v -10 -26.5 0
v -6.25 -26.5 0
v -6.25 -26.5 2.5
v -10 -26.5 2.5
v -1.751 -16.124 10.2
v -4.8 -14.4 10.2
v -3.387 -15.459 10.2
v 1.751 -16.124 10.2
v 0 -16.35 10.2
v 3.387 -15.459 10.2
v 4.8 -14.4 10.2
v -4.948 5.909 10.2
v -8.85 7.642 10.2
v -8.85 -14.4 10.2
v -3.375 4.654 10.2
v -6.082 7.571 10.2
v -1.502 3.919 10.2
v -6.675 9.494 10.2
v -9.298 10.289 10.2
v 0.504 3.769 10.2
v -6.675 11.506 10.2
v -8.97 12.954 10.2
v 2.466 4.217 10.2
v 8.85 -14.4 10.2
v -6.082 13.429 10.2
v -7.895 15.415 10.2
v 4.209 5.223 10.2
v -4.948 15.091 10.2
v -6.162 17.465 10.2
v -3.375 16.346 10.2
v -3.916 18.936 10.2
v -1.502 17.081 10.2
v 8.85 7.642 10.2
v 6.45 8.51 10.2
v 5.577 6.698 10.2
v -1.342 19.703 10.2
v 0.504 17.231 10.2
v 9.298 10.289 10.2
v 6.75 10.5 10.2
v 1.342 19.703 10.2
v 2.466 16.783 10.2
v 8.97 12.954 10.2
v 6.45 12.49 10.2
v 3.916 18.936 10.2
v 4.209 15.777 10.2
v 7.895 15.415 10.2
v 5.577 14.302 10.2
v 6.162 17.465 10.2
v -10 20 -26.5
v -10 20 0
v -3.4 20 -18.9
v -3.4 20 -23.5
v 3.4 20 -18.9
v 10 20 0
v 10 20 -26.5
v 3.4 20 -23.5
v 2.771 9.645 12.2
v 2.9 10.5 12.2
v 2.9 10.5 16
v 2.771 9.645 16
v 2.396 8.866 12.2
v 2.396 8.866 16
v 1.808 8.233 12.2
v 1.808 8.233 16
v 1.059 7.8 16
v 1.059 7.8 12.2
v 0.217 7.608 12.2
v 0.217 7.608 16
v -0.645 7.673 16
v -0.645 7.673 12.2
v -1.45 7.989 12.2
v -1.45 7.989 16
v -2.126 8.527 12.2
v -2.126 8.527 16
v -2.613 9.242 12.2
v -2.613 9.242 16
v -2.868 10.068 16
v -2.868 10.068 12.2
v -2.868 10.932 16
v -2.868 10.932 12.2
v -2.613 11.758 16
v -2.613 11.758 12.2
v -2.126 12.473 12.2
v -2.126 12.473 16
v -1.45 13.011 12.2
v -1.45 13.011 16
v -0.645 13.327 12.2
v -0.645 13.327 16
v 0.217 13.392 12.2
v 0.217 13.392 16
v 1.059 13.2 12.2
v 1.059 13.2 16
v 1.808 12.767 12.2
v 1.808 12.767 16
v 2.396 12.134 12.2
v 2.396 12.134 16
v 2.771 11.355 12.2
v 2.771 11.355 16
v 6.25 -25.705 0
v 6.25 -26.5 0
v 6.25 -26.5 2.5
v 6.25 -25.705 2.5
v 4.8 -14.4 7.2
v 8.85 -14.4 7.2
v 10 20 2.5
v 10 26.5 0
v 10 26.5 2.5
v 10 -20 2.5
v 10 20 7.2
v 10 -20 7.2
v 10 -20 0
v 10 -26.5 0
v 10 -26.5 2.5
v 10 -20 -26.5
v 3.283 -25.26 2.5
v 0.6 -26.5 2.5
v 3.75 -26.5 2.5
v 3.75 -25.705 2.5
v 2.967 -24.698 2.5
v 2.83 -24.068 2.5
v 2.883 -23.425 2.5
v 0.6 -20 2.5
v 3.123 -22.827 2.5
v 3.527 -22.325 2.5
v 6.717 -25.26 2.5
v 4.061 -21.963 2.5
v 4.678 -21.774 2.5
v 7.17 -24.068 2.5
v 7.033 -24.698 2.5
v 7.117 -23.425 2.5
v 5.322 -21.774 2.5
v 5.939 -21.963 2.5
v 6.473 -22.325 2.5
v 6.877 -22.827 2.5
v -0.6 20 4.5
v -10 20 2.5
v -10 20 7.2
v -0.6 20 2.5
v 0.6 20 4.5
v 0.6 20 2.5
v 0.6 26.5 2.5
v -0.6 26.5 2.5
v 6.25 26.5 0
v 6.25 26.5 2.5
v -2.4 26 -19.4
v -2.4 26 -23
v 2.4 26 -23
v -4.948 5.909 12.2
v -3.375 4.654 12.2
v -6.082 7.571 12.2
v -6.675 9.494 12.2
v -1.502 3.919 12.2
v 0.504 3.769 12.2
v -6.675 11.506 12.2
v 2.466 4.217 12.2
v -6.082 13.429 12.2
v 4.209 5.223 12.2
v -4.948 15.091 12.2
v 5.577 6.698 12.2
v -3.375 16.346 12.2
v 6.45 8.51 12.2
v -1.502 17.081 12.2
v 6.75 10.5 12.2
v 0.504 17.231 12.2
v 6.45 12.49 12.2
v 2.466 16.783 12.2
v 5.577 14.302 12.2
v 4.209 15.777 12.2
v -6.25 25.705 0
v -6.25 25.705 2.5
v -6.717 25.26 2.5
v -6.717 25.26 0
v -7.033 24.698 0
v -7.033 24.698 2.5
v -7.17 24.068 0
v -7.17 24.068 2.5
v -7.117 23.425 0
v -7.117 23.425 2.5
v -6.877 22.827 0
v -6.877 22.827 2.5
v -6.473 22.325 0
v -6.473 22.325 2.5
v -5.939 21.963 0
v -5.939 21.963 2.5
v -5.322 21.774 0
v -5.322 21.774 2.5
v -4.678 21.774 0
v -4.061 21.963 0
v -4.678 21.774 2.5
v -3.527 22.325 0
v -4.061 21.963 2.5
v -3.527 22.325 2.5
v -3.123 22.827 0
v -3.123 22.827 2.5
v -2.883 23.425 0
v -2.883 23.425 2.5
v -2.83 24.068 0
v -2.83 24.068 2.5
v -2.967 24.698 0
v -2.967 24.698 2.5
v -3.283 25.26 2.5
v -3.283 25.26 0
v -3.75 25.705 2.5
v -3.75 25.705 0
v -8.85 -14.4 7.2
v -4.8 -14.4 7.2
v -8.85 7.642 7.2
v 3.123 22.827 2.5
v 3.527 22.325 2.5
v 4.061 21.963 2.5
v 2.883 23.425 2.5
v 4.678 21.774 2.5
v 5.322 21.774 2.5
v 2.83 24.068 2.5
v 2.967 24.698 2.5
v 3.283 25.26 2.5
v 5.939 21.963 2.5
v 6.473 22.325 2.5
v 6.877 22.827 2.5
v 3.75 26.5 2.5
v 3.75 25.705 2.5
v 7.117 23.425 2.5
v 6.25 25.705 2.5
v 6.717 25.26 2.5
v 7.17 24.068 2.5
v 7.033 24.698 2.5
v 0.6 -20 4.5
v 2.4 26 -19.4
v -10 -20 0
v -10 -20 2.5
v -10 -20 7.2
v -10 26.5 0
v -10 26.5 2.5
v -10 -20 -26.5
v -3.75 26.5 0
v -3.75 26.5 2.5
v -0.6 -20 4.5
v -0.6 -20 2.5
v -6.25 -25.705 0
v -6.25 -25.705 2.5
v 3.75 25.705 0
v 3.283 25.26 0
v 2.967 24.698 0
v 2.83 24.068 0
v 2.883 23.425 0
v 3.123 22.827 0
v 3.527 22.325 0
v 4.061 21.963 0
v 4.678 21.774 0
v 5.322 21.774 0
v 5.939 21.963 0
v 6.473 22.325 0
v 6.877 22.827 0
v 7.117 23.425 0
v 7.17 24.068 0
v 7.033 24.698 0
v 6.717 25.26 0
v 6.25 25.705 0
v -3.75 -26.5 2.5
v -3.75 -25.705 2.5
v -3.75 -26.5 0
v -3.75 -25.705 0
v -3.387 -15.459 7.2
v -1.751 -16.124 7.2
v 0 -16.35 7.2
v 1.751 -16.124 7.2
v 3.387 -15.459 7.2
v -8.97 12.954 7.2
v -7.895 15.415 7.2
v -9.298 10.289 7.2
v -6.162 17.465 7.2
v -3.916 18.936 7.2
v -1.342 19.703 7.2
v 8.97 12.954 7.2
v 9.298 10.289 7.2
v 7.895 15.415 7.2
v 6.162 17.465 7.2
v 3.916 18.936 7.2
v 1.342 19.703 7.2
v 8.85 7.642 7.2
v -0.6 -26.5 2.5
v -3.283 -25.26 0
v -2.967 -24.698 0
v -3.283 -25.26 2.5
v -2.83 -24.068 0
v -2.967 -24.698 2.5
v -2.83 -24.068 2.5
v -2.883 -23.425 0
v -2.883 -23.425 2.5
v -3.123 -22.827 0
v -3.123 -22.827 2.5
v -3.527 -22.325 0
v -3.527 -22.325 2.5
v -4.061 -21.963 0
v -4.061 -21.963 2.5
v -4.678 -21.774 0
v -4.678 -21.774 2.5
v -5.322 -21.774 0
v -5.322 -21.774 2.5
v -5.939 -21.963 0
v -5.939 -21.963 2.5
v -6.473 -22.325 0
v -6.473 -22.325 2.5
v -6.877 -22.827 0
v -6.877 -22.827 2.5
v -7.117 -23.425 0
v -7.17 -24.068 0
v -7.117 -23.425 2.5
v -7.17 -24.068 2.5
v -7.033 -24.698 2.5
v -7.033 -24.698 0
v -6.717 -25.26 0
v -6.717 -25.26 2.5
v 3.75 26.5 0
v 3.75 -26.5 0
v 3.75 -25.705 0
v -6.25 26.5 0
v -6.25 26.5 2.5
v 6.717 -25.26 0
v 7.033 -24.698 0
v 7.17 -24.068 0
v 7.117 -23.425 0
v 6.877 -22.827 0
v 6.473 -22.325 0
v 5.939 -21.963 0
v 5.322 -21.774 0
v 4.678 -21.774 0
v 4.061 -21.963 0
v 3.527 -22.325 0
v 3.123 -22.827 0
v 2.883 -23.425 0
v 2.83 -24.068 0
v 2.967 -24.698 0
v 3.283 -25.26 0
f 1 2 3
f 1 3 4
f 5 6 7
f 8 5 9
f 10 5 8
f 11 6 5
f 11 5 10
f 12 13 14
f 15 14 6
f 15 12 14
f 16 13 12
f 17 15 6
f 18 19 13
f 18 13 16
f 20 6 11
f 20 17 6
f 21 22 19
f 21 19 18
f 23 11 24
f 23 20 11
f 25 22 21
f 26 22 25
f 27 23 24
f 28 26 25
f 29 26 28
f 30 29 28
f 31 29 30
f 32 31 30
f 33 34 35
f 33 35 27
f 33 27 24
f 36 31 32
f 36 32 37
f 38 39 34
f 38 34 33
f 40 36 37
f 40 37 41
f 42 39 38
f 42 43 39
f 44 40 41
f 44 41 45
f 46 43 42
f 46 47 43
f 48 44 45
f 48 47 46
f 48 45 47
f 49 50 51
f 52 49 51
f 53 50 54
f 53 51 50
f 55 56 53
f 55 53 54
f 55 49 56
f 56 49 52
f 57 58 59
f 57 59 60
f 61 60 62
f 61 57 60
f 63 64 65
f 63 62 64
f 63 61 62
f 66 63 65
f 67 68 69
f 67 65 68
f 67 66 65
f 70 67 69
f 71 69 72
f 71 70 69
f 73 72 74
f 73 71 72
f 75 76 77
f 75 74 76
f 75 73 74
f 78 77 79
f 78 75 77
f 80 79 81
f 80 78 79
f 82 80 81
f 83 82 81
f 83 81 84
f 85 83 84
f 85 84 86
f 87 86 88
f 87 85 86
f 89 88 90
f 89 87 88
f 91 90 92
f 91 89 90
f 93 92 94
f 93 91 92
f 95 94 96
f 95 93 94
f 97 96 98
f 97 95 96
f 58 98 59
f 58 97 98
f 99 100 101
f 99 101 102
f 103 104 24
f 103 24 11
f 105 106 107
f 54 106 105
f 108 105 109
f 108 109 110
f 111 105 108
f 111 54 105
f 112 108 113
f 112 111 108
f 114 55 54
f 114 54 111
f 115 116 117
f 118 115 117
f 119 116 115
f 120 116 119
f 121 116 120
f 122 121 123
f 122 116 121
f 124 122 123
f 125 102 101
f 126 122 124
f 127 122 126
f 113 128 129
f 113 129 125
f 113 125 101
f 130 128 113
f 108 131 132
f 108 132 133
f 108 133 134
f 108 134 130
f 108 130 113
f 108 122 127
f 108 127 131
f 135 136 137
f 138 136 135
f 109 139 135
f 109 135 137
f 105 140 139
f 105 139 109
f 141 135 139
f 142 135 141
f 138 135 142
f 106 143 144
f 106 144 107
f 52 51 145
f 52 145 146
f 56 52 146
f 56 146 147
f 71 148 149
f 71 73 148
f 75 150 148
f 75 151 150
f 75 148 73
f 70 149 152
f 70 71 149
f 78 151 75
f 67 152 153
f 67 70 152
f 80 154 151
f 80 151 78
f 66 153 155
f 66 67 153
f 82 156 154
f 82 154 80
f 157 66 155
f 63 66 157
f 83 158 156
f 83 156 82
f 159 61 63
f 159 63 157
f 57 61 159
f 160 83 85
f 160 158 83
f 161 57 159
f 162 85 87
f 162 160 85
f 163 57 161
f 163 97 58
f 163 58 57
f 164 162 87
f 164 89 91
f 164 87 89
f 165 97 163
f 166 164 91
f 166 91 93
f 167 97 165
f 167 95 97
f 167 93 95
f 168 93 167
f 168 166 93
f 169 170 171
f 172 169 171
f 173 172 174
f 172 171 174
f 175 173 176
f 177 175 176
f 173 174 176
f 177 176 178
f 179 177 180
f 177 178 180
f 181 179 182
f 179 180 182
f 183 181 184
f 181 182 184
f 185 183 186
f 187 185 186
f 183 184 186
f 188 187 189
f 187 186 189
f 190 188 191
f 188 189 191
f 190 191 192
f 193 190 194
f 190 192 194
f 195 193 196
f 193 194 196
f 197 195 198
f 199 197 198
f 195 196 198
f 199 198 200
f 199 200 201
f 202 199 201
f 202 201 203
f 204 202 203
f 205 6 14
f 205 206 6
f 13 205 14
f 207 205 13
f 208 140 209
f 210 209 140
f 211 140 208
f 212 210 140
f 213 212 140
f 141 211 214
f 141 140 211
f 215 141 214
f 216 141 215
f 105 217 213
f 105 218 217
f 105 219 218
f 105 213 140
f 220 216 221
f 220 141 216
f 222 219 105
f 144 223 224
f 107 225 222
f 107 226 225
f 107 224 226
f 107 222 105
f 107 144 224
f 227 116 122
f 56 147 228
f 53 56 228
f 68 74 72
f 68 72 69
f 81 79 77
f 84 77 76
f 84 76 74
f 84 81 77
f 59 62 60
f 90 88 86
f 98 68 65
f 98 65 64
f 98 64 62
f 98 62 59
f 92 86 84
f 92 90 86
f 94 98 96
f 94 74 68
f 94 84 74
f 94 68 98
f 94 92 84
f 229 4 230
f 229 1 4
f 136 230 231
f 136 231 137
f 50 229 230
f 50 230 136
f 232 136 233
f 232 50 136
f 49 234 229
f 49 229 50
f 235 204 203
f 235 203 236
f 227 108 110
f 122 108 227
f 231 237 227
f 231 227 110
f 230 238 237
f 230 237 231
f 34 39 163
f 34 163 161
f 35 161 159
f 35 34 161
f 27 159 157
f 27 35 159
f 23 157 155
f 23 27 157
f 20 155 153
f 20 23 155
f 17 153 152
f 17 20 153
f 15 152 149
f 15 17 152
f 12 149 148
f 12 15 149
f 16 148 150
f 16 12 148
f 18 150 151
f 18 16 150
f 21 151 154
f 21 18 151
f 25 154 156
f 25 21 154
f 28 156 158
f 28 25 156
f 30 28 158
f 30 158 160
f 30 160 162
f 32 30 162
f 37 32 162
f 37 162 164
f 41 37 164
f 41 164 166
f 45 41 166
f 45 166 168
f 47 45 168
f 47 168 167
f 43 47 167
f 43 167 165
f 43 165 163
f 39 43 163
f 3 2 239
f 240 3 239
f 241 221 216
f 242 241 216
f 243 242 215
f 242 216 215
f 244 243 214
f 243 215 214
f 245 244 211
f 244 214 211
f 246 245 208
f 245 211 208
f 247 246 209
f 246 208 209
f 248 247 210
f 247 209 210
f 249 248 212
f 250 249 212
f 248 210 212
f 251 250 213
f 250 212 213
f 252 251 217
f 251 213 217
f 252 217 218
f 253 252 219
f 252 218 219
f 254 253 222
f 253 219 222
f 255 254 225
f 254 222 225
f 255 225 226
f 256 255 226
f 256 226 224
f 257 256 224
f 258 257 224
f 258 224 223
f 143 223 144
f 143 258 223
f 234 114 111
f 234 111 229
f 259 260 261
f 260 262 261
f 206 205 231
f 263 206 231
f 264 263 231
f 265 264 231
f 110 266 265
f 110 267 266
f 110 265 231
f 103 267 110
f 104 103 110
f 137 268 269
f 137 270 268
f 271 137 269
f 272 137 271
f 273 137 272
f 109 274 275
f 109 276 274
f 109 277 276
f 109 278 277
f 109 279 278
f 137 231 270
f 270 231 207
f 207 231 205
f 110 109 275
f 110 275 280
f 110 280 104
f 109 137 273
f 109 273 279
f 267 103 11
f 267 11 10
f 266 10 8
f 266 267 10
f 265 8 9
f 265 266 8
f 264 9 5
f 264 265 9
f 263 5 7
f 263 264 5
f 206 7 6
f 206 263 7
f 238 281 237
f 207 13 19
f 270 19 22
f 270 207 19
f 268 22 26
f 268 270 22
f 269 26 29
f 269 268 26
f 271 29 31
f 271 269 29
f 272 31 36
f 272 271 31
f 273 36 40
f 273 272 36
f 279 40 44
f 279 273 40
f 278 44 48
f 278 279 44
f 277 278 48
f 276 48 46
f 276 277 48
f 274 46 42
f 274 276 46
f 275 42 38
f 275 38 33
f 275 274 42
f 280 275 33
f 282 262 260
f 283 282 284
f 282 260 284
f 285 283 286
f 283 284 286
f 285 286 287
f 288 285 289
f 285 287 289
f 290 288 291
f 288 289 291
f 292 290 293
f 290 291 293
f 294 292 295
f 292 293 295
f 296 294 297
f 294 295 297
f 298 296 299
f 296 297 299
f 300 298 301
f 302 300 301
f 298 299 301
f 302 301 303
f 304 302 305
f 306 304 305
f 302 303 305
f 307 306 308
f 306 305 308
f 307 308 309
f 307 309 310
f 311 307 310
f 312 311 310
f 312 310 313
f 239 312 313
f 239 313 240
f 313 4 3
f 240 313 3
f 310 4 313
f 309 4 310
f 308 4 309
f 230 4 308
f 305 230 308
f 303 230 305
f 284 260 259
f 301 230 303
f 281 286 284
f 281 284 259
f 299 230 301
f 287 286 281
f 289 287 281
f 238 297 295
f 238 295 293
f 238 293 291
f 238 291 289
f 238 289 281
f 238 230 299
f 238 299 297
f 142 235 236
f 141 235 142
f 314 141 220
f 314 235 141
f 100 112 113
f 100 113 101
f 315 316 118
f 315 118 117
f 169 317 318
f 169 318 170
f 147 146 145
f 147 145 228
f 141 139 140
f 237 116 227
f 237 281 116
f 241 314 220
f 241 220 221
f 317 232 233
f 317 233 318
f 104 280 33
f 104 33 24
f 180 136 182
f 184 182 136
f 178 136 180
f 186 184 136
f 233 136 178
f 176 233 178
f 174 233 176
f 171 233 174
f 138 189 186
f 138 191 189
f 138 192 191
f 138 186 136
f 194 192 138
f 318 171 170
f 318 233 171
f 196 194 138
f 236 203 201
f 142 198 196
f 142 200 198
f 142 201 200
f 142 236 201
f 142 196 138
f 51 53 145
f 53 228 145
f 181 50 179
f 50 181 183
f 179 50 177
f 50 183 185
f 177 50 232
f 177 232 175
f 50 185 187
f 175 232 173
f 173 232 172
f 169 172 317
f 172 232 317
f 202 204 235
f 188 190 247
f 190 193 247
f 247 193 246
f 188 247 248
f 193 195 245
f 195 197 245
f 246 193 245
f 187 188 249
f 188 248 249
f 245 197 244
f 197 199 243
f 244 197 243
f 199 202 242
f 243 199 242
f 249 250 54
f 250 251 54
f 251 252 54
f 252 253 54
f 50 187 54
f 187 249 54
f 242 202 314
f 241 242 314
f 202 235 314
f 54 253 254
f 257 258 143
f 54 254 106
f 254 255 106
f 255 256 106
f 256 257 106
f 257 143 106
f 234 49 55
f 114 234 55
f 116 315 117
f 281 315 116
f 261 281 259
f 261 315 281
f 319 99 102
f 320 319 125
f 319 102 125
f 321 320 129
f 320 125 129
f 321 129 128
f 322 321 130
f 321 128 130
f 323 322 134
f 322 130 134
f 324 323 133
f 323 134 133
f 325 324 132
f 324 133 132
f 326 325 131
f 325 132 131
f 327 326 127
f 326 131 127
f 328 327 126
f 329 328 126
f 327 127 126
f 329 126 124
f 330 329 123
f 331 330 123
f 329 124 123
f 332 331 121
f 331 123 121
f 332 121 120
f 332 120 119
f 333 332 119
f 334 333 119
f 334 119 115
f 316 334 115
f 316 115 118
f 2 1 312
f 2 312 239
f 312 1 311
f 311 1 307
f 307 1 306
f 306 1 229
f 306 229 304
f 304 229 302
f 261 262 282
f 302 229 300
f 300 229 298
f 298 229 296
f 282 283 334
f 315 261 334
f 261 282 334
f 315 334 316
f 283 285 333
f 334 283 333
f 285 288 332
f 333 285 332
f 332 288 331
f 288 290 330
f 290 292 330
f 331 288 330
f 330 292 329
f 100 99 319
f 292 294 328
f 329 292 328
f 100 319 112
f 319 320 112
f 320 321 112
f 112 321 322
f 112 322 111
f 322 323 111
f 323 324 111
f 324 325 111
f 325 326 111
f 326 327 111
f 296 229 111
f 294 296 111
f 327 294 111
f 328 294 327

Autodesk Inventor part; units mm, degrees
ref_plane "YZ Plane" through (0, 0, 0) normal (1, 0, 0) x (0, 1, 0)
ref_plane "XZ Plane" through (0, 0, 0) normal (0, 1, 0) x (-1, 0, 0)
ref_plane "XY Plane" through (0, 0, 0) normal (0, 0, 1) x (1, 0, 0)
sketch "Sketch1" plane through (0, 0, 0) normal (0, 0, 1) x (1, 0, 0)
  line L0 (-14, 0) -> (14, 0) projected
  line L1 (0, 28) -> (0, -28) projected
  line L2 (-10, 20) -> (10, 20)
  line L3 (10, 20) -> (10, -20)
  line L4 (10, -20) -> (-10, -20)
  line L5 (-10, -20) -> (-10, 20)
  point P0 (0, 0)
  dimension "d0" = 20
  dimension "d1" = 40
extrude "Extrusion1" add sketch "Sketch1" along normal blind 7.2 and the other way blind 26.5
sketch "Sketch2" plane through (0, 0, 0) normal (0, 0, 1) x (1, 0, 0)
  line L0 (-14, 0) -> (14, 0) projected
  line L1 (0, 28) -> (0, -28) projected
  line L2 (-10, 20) -> (-10, -20) projected
  line L3 (10, -20) -> (10, 20) projected
  line L4 (-10, 26.5) -> (10, 26.5)
  line L5 (10, 26.5) -> (10, -26.5)
  line L6 (10, -26.5) -> (-10, -26.5)
  line L7 (-10, -26.5) -> (-10, 26.5)
  point P0 (0, 0)
  dimension "d6" = 53
extrude "Extrusion2" add sketch "Sketch2" along normal blind 2.5
sketch "Sketch3" plane through (0, 0, 0) normal (0, 0, 1) x (1, 0, 0)
  line L0 (0, 37.1) -> (0, -37.1) projected
  line L1 (-14, 0) -> (14, 0) projected
  line L2 (-5, 23.925) -> (5, 23.925) construction
  line L3 (5, 23.925) -> (5, -23.925) construction
  line L4 (5, -23.925) -> (-5, -23.925) construction
  line L5 (-5, -23.925) -> (-5, 23.925) construction
  point P0 (0, 0)
  dimension "d9" = 47.85
  dimension "d10" = 10
hole "Hole1" at (5, 23.925, 0) at (-5, 23.925, 0) at (-5, -23.925, 0) at (5, -23.925, 0) direction (0, 0, 1) diameter 4.35 depth 8 tip angle 118
sketch "Sketch4" plane through (0, 0, 0) normal (0, 0, 1) x (1, 0, 0)
  line L0 (-14, 0) -> (14, 0) projected
  line L1 (0, 37.1) -> (0, -37.1) projected
  line L2 (10, 26.5) -> (-10, 26.5) projected
  line L3 (-10, -26.5) -> (10, -26.5) projected
  circle A0 centre (-5, 23.925) radius 2.175 projected
  circle A1 centre (5, 23.925) radius 2.175 projected
  circle A2 centre (-5, -23.925) radius 2.175 projected
  circle A3 centre (5, -23.925) radius 2.175 projected
  line L4 (-6.25, -23.925) -> (-3.75, -23.925)
  line L5 (-3.75, -23.925) -> (-3.75, -26.5)
  line L6 (-3.75, -26.5) -> (-6.25, -26.5)
  line L7 (-6.25, -26.5) -> (-6.25, -23.925)
  line L8 (6.25, -23.925) -> (3.75, -23.925)
  line L9 (3.75, -23.925) -> (3.75, -26.5)
  line L10 (3.75, -26.5) -> (6.25, -26.5)
  line L11 (6.25, -26.5) -> (6.25, -23.925)
  line L12 (-10, 26.5) -> (10, 26.5) projected
  line L13 (6.25, 26.5) -> (3.75, 26.5)
  line L14 (3.75, 26.5) -> (3.75, 23.925)
  line L15 (3.75, 23.925) -> (6.25, 23.925)
  line L16 (6.25, 23.925) -> (6.25, 26.5)
  line L17 (-3.75, 26.5) -> (-6.25, 26.5)
  line L18 (-6.25, 26.5) -> (-6.25, 23.925)
  line L19 (-6.25, 23.925) -> (-3.75, 23.925)
  line L20 (-3.75, 23.925) -> (-3.75, 26.5)
  point P0 (0, 0)
  dimension "d18" = 2.5
  dimension "d19" = 2.5
  dimension "d20" = 2.5
  dimension "d21" = 2.5
extrude "Extrusion3" cut sketch "Sketch4" along normal through all contours L9 A3 L11 L3 | L3 L7 A2 L5 | L2 L16 A1 L14 | L20 A0 L18 L2 | A1 L16 L15 L14 | L20 L19 L18 A0 | A2 L7 L4 L5 | L9 L8 L11 A3 picked at (4.9114, 24.6446) picked at (-5.0886, 24.6446) picked at (-5.0886, -24.6446) picked at (4.9114, -24.6446)
sketch "Sketch5" plane through (0, 0, 0) normal (1, 0, 0) x (0, 1, 0)
  line L0 (20, 2.5) -> (26.5, 2.5) projected
  line L1 (20, 7.2) -> (20, 2.5) projected
  line L2 (26.5, 2.5) -> (20, 2.5)
  line L3 (20, 2.5) -> (20, 4.5)
  line L4 (20, 4.5) -> (26.5, 2.5)
  point P0 (0, 0)
  dimension "d24" = 2
extrude "Extrusion4" add sketch "Sketch5" along normal mid plane 1.2
mirror "Mirror1" about plane through (0, 0, 0) normal (0, 1, 0) of "Extrusion4"
sketch "Sketch6" plane through (0, 0, 7.2) normal (0, 0, 1) x (1, 0, 0)
  line L0 (0, 37.1) -> (0, -37.1) projected
  line L1 (-14, 0) -> (14, 0) projected
  circle A0 centre (0, 10.5) radius 6.75
  line L2 (-10, -20) -> (10, -20) projected
  point P0 (0, 0)
  dimension "d27" = 30.5
  dimension "d28" = 13.5
extrude "Extrusion5" add sketch "Sketch6" along normal blind 5
sketch "Sketch7" plane through (0, 0, 7.2) normal (0, 0, 1) x (1, 0, 0)
  circle A0 centre (0, 10.5) radius 6.75 projected
  circle A1 centre (0, 10.5) radius 9.3
  point P0 (0, 0)
  dimension "d31" = 18.6
extrude "Extrusion6" add sketch "Sketch7" along normal blind 3
sketch "Sketch8" plane through (0, 0, 7.2) normal (0, 0, 1) x (1, 0, 0)
  line L0 (-14, 0) -> (14, 0) projected
  line L1 (0, 37.1) -> (0, -37.1) projected
  circle A0 centre (0, 10.5) radius 9.3 projected
  line L2 (-8.85, 10.5) -> (8.85, 10.5)
  line L3 (8.85, 10.5) -> (8.85, -14.4)
  line L4 (8.85, -14.4) -> (-8.85, -14.4)
  line L5 (-8.85, -14.4) -> (-8.85, 10.5)
  line L6 (10, 20) -> (-10, 20) projected
  point P0 (0, 0)
  dimension "d34" = 17.7
  dimension "d35" = 34.4
extrude "Extrusion7" add sketch "Sketch8" along normal blind 3 contours L5 A0 L1 L0 | L0 L1 L4 L5 | L1 A0 L3 L0 | L0 L3 L4 L1 | L5 L2 L1 A0 | L1 L2 L3 A0 picked at (-5.9, 9.5474) picked at (5.9, 9.5474)
sketch "Sketch9" plane through (0, 0, 7.2) normal (0, 0, 1) x (1, 0, 0)
  line L0 (0, 37.1) -> (0, -37.1) projected
  line L1 (10, 20) -> (-10, 20) projected
  line L2 (-8.85, -14.4) -> (8.85, -14.4) projected
  arc A0 (-4.8, -14.4) -> (4.8, -14.4) centre (0, -9.4673) ccw
  point P0 (0, 0)
  dimension "d38" = 9.6
  dimension "d39" = 36.35
extrude "Extrusion8" add sketch "Sketch9" along normal blind 3
sketch "Sketch10" plane through (-10, 20, -26.5) normal (0, 1, 0) x (1, 0, 0)
  line L0 (0, 0) -> (20, 0) projected
  line L1 (10, 7.74) -> (10, -46.44) projected
  line L2 (0, -26.5) -> (20, -26.5) projected
  line L3 (20, -26.5) -> (20, 0) projected
  line L4 (0, 0) -> (20, 0) projected
  line L5 (0, 0) -> (0, -26.5) projected
  line L6 (6.6, -7.6) -> (13.4, -7.6)
  line L7 (13.4, -7.6) -> (13.4, -3)
  line L8 (13.4, -3) -> (6.6, -3)
  line L9 (6.6, -3) -> (6.6, -7.6)
  point P0 (10, -26.5)
  dimension "d42" = 3
  dimension "d43" = 4.6
  dimension "d44" = 6.8
extrude "Extrusion9" add sketch "Sketch10" along normal blind 6 contours L8 L7 L6 L1 | L1 L6 L9 L8
chamfer "Chamfer1" distance 6 distance2 1 1 edges at (3.4, 26, -21.2) measured on face at (3.4, 22, -20.4333)
chamfer "Chamfer2" distance 6 distance2 1 1 edges at (-3.4, 26, -21.2) measured on face at (-3.4, 22, -21.9667)
chamfer "Chamfer3" distance 6 distance2 0.5 1 edges at (0, 26, -18.9) measured on face at (0.8002, 22.0003, -18.9)
chamfer "Chamfer4" distance 6 distance2 0.5 1 edges at (0, 26, -23.5) measured on face at (0.8002, 22.0003, -23.5)
sketch "Sketch11" plane through (0, 10.5, 12.2) normal (0, 0, 1) x (1, 0, 0)
  circle A0 centre (0, 0) radius 6.75 projected
  circle A1 centre (0, 0) radius 2.9
  point P0 (0, -10.5)
  dimension "d59" = 5.8
extrude "Extrusion10" add sketch "Sketch11" along normal blind 3.8 contours A1
equation "\"d19\" = d18"
equation "\"d20\" = d18"
equation "\"d21\" = d18"
properties part number "servo motor HS-7955TG"
